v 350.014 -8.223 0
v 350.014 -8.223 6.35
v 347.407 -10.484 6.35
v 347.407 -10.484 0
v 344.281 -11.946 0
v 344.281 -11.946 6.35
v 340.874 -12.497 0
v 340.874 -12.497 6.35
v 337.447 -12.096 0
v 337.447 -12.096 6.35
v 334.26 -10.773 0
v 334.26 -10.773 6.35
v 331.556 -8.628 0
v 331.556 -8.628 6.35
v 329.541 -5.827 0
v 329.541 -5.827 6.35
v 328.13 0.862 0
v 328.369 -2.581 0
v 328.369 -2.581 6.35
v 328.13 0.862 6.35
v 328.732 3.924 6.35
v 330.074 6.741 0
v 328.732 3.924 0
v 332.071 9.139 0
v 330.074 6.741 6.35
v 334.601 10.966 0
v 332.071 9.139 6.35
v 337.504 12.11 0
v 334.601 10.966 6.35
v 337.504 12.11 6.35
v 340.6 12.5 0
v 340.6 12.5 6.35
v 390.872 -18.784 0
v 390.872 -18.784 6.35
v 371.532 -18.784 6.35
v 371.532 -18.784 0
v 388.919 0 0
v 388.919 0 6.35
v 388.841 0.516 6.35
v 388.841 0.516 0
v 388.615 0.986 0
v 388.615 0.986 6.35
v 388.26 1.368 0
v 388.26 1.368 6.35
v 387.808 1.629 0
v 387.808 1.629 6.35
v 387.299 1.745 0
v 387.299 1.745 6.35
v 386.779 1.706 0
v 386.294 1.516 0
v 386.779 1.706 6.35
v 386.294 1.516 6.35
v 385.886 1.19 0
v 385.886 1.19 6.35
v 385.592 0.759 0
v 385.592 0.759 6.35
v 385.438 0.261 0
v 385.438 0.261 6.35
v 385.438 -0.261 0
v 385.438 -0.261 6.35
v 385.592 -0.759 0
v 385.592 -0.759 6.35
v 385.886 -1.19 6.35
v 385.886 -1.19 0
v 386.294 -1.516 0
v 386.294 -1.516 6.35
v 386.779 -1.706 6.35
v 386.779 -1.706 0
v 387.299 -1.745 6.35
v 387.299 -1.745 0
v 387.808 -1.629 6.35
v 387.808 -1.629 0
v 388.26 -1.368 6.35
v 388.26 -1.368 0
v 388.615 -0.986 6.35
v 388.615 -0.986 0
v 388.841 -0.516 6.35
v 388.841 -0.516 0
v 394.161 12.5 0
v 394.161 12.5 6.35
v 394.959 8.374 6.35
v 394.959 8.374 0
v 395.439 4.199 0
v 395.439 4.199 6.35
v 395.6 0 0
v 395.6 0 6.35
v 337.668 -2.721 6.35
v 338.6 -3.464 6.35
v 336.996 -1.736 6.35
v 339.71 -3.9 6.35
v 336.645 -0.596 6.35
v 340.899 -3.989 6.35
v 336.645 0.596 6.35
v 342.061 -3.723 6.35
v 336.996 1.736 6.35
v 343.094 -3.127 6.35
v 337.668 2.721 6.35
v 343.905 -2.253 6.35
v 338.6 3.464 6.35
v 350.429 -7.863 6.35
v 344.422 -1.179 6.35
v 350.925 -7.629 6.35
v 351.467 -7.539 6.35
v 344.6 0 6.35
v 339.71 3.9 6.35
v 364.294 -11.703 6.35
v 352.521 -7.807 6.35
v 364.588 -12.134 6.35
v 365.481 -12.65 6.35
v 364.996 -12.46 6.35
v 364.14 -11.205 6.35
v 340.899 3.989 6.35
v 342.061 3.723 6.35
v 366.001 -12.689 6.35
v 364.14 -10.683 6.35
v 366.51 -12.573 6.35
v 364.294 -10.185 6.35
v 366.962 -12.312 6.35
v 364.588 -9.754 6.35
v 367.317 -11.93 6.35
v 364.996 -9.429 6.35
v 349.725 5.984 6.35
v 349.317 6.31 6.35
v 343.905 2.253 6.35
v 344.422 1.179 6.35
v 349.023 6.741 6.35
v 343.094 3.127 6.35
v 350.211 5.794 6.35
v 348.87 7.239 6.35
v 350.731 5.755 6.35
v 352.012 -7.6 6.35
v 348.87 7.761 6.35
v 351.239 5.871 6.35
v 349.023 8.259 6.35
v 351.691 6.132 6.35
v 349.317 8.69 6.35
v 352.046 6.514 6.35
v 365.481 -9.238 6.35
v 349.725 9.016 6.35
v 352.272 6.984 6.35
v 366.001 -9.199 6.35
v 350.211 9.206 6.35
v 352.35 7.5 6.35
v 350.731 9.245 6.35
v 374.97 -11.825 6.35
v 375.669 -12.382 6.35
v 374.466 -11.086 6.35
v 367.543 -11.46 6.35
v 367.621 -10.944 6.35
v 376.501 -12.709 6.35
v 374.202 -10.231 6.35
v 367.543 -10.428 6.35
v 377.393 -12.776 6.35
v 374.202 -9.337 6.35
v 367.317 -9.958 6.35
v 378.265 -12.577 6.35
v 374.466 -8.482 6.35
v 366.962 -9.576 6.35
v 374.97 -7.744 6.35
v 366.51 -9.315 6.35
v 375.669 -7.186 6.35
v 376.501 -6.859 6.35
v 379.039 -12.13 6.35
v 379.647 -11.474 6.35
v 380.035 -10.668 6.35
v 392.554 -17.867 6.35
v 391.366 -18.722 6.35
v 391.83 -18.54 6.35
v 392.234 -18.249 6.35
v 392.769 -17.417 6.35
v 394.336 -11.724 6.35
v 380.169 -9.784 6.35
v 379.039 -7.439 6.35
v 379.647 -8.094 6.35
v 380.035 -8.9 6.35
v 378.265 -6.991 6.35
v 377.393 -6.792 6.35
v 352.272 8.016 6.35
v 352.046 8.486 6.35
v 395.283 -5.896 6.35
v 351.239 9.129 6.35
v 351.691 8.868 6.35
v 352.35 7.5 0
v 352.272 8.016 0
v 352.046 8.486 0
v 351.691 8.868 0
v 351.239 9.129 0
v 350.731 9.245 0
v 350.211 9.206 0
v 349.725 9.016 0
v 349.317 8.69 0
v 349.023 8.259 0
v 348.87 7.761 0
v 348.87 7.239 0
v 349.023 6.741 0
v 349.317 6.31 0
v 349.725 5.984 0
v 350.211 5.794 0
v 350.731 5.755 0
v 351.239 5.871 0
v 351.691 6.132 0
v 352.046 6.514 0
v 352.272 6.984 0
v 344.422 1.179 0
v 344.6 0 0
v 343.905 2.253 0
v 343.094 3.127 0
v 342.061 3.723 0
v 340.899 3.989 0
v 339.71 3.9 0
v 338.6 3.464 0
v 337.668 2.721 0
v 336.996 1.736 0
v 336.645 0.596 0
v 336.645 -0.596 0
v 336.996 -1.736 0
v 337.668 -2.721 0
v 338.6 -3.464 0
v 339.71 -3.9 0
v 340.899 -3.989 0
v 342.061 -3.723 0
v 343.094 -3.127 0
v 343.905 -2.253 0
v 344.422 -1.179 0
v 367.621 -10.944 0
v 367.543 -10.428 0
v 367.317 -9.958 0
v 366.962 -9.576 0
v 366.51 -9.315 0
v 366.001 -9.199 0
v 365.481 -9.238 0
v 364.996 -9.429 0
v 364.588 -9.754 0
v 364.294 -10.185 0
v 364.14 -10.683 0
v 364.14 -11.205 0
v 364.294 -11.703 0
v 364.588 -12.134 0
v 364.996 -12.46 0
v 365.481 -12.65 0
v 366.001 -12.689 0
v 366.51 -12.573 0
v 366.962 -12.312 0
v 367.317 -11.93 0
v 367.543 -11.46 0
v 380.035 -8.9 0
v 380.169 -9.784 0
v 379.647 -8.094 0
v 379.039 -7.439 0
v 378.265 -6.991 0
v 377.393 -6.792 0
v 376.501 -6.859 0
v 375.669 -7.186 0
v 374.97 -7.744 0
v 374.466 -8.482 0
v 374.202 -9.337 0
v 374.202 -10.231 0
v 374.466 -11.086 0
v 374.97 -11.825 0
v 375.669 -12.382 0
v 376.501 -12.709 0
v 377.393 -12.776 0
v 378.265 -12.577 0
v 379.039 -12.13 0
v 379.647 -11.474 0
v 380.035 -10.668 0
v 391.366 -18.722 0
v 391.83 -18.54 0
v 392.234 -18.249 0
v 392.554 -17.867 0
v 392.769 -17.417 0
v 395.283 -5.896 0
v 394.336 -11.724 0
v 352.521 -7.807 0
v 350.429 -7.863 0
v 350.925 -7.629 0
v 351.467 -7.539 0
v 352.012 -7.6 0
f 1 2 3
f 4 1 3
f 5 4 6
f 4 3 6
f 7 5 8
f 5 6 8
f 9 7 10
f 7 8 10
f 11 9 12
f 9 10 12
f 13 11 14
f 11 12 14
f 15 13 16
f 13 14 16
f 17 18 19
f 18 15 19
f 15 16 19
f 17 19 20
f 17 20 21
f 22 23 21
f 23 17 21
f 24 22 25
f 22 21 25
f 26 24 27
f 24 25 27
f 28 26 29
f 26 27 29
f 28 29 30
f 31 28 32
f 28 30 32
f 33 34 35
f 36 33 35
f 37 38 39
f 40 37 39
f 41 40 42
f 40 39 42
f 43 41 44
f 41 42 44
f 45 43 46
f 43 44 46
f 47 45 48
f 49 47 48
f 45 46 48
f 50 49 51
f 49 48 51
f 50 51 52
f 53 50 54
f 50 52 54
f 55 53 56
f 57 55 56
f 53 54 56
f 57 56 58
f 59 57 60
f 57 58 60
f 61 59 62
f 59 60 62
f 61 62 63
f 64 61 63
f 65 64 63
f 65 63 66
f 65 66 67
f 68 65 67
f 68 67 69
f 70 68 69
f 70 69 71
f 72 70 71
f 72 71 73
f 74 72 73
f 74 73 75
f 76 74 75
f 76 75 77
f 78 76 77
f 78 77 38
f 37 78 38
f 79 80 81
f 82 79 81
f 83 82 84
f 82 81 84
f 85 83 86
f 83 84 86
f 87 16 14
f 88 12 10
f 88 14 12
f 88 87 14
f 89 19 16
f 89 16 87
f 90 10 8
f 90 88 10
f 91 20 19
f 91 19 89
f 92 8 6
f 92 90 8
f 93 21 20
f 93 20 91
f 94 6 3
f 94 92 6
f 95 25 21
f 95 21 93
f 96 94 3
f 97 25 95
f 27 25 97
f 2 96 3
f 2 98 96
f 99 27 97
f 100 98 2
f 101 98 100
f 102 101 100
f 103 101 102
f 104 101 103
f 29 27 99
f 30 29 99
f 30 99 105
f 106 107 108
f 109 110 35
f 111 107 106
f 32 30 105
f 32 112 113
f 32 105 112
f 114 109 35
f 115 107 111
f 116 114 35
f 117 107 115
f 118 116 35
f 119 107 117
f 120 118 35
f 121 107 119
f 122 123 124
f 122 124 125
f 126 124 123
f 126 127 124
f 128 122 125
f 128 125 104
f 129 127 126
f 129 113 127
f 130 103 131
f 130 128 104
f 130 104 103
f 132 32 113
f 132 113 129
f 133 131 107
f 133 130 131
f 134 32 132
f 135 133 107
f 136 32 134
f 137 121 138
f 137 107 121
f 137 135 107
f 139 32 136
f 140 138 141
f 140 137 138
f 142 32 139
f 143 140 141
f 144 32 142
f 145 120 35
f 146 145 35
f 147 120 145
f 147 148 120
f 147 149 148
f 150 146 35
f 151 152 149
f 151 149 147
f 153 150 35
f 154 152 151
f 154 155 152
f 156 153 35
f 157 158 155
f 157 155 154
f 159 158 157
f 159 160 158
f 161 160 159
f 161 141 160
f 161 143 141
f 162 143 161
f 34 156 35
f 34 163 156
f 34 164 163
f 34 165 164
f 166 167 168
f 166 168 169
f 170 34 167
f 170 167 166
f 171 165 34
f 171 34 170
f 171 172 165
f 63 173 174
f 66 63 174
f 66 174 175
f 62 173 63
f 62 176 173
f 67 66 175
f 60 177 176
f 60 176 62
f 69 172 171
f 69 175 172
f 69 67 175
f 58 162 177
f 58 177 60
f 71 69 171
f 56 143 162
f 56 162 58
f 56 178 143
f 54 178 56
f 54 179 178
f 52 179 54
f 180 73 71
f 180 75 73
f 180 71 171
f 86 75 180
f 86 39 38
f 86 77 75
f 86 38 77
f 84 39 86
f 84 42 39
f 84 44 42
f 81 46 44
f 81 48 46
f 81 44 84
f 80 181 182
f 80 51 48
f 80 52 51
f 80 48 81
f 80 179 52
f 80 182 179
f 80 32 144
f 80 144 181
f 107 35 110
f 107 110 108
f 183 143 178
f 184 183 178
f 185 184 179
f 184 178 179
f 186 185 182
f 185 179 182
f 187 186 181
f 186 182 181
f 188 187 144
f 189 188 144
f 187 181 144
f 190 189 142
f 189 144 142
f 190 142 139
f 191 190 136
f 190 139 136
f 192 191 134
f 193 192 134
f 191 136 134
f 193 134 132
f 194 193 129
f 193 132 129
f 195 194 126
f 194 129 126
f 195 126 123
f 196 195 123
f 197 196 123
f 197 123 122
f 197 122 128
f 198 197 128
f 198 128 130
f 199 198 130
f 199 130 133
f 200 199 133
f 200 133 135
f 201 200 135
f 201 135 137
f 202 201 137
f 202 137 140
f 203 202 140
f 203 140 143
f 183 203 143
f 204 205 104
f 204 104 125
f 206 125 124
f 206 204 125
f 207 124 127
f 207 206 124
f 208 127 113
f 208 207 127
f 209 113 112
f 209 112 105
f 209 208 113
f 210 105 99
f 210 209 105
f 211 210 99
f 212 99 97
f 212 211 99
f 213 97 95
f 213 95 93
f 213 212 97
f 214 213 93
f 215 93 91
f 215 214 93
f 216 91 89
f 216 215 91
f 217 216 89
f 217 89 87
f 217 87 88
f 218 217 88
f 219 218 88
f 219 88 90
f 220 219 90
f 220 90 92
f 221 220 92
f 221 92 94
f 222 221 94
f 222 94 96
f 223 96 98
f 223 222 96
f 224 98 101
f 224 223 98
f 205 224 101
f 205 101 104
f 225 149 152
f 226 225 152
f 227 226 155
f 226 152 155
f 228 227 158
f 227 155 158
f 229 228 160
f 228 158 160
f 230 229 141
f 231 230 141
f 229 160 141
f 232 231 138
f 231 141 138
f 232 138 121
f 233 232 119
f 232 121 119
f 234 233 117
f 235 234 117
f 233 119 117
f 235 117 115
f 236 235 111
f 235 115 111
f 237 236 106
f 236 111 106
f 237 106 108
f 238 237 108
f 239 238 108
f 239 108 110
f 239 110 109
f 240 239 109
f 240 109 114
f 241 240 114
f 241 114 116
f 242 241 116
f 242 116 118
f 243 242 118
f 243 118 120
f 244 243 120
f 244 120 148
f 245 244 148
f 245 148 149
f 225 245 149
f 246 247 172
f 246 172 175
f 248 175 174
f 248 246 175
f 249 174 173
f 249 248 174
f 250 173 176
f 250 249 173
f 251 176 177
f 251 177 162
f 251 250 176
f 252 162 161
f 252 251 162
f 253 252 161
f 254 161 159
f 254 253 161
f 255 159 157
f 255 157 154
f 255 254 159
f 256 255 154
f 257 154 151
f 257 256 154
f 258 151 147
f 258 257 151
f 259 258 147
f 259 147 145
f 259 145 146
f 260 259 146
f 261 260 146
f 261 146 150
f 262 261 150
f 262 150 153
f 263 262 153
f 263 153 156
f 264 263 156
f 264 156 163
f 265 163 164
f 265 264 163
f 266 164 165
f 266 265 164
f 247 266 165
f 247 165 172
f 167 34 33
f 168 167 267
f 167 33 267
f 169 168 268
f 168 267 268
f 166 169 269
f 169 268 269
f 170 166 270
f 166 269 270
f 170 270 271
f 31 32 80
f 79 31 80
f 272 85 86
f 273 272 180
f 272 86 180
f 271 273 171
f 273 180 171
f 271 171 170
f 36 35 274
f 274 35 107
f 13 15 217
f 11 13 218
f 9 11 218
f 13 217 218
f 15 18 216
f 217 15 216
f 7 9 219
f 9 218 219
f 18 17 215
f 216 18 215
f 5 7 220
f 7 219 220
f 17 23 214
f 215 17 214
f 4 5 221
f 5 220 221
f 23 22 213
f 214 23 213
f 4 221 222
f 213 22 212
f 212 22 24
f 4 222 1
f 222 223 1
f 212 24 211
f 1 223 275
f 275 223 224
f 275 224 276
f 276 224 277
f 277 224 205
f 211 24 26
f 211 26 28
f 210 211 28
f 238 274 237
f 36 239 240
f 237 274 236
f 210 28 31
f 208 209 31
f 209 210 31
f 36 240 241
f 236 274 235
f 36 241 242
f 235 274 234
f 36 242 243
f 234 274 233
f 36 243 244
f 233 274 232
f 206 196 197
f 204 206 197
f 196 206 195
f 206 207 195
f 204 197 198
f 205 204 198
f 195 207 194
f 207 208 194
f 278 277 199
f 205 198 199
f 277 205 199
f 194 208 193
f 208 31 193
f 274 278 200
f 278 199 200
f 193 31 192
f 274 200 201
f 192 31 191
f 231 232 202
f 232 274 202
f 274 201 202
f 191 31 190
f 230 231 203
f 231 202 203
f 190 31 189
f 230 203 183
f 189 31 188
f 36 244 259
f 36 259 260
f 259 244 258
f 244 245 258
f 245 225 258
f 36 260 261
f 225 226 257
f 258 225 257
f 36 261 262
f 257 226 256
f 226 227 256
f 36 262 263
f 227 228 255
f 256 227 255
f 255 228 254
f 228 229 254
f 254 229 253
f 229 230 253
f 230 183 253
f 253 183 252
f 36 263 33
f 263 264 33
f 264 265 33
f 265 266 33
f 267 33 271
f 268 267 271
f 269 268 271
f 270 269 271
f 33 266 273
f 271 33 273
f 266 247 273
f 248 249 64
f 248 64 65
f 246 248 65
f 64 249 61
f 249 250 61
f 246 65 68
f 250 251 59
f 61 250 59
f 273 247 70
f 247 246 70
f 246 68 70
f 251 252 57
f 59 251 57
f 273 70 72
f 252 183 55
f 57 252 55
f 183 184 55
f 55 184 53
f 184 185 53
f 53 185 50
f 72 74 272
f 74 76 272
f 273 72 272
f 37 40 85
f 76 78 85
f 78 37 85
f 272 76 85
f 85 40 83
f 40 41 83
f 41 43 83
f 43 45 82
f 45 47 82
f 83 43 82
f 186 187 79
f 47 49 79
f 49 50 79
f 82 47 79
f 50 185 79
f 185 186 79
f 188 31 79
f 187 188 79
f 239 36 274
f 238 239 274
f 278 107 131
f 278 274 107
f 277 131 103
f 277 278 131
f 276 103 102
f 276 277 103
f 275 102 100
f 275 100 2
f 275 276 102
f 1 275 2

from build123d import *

# Parameters (mm, degrees)
SKETCH1_W           = 500
SKETCH1_H           = 150
SKETCH1_R           = 9.3
SKETCH1_R_2         = 3
SKETCH1_R_3         = 4
BOSS_EXTRUDE1_DEPTH = 6.35
CUT_EXTRUDE1_DEPTH  = 7
SKETCH4_R           = 9.3
CUT_EXTRUDE2_DEPTH  = 10
FILLET1_R           = 2
CUT_EXTRUDE4_DEPTH  = 10
SKETCH6_R           = 1.75
SKETCH6_R_2         = 3
CUT_EXTRUDE5_DEPTH  = 10


with BuildPart() as part:
    # Sketch1 → Boss-Extrude1 (new body)
    with BuildSketch(Plane.XY):
        with Locations((200, 0)):
            Rectangle(SKETCH1_W, SKETCH1_H)
        Circle(SKETCH1_R, mode=Mode.SUBTRACT)
        with BuildLine():
            ThreePointArc((303.793920425, 21.250000148), (340.59999997, 42.5), (377.406079545, 21.250000201))
            ThreePointArc((377.406079545, 21.250000201), (375.758965412, 15.102885723), (369.61185099, 16.750000063))
            ThreePointArc((369.61185099, 16.750000063), (340.600001147, 33.5), (311.588150157, 16.750002051))
            ThreePointArc((311.588150157, 16.750002051), (305.441035607, 15.102885134), (303.793920425, 21.250000148))
        make_face(mode=Mode.SUBTRACT)
        with Locations((377.1687, -9.7841)):
            Circle(SKETCH1_R_2, mode=Mode.SUBTRACT)
        with Locations((340.6, 0)):
            Circle(SKETCH1_R_3, mode=Mode.SUBTRACT)
    extrude(amount=BOSS_EXTRUDE1_DEPTH)

    # Sketch3 → Cut-Extrude1 (cut)
    with BuildSketch(Plane.XY.offset(6.35)):
        with BuildLine():
            Line((36.827355724, 55), (-50, 55))
            Line((-50, 55), (-50, -75))
            Line((-50, -75), (450, -75))
            Line((450, -75), (450, 55))
            Line((450, 55), (340.6, 55))
            ThreePointArc((340.6, 55), (379.490872965, 38.890872965), (395.6, 0))
            ThreePointArc((395.6, 0), (394.766919757, -9.536498518), (392.292916219, -18.7841))
            ThreePointArc((392.292916219, -18.7841), (329.589221669, -53.886573101), (285.681879129, 3))
            Line((285.681879129, 3), (30.896152423, 3))
            Line((30.896152423, 3), (21.172644276, 3))
            Line((21.172644276, 3), (9.086322138, -9.086322138))
            ThreePointArc((9.086322138, -9.086322138), (-9.086322138, -9.086322138), (-9.086322138, 9.086322138))
            Line((-9.086322138, 9.086322138), (36.827355724, 55))
        make_face()
        with BuildLine():
            Line((328.4653389, 3), (285.681879129, 3))
            ThreePointArc((285.681879129, 3), (329.589221669, -53.886573101), (392.292916219, -18.7841))
            Line((392.292916219, -18.7841), (371.532319214, -18.7841))
            Line((371.532319214, -18.7841), (351.002913897, -6.930323401))
            ThreePointArc((351.002913897, -6.930323401), (335.559903988, -11.438856245), (328.4653389, 3))
        make_face()
        Polygon((-50, 75), (-50, 55), (36.827355724, 55), (340.6, 55), (450, 55), (450, 75), align=None)
    extrude(amount=-CUT_EXTRUDE1_DEPTH, mode=Mode.SUBTRACT)

    # Sketch4 → Cut-Extrude2 (cut)
    with BuildSketch(Plane.XY.offset(6.35)):
        with BuildLine():
            Line((23.112698372, 8), (6.470027048, 24.642671324))
            Line((6.470027048, 24.642671324), (-9.086322138, 9.086322138))
            ThreePointArc((-9.086322138, 9.086322138), (4.917482106, 11.871851993), (12.85, 0))
            ThreePointArc((12.85, 0), (11.871851993, -4.917482106), (9.086322138, -9.086322138))
            Line((9.086322138, -9.086322138), (21.172644276, 3))
            Line((21.172644276, 3), (41, 3))
            Line((41, 3), (41, 8))
            Line((41, 8), (23.112698372, 8))
        make_face()
        with BuildLine():
            ThreePointArc((12.85, 0), (4.917482106, 11.871851993), (-9.086322138, 9.086322138))
            ThreePointArc((-9.086322138, 9.086322138), (-9.086322138, -9.086322138), (9.086322138, -9.086322138))
            ThreePointArc((9.086322138, -9.086322138), (11.871851993, -4.917482106), (12.85, 0))
        make_face()
        Circle(SKETCH4_R, mode=Mode.SUBTRACT)
        Polygon((36.827355724, 55), (30.827355724, 49), (50.827355724, 49), (50.827355724, 55), align=None)
    extrude(amount=-CUT_EXTRUDE2_DEPTH, mode=Mode.SUBTRACT)

    # Fillet1
    fillet1_edges = [part.edges().sort_by_distance(p)[0] for p in [
        (328.4653389, 3, 3.175),
        (351.002913897, -6.930323401, 3.175),
        (392.292916219, -18.7841, 3.175),
    ]]
    fillet(fillet1_edges, radius=FILLET1_R)

    # Sketch5 → Cut-Extrude4 (cut)
    with BuildSketch(Plane.XY.offset(6.35)):
        with BuildLine():
            ThreePointArc((328.129761947, 0.862068966), (332.07139701, 9.138540969), (340.6, 12.5))
            Line((340.6, 12.5), (394.160713214, 12.5))
            ThreePointArc((394.160713214, 12.5), (374.786985828, 43.084219849), (340.6, 55))
            Line((340.6, 55), (50.827355724, 55))
            Line((50.827355724, 55), (50.827355724, 49))
            Line((50.827355724, 49), (30.827355724, 49))
            Line((30.827355724, 49), (6.470027048, 24.642671324))
            Line((6.470027048, 24.642671324), (23.112698372, 8))
            Line((23.112698372, 8), (41, 8))
            Line((41, 8), (41, 3))
            Line((41, 3), (326.134523859, 3))
            ThreePointArc((326.134523859, 3), (327.596690413, 2.364576478), (328.129761947, 0.862068966))
        make_face()
        with BuildLine():
            ThreePointArc((311.588150157, 16.750002051), (305.441035607, 15.102885134), (303.793920425, 21.250000148))
            ThreePointArc((303.793920425, 21.250000148), (340.59999997, 42.5), (377.406079545, 21.250000201))
            ThreePointArc((377.406079545, 21.250000201), (375.758965412, 15.102885723), (369.61185099, 16.750000063))
            ThreePointArc((369.61185099, 16.750000063), (340.600001147, 33.5), (311.588150157, 16.750002051))
        make_face(mode=Mode.SUBTRACT)
    extrude(amount=-CUT_EXTRUDE4_DEPTH, mode=Mode.SUBTRACT)


with BuildPart() as cut_extrude4_kept_piece:
    # of the separate pieces the step leaves, the one the design keeps (cut_extrude4_pieces_kept)
    add(part.part.solids().sort_by_distance((340.6, 12.5, 0))[0])

    # Sketch6 → Cut-Extrude5 (cut)
    with BuildSketch(Plane.XY.offset(6.35)):
        with Locations((350.6, 7.5)):
            Circle(SKETCH6_R)
        with Locations((387.1687, 0)):
            Circle(SKETCH6_R)
        with Locations((377.1687, -9.7841)):
            Circle(SKETCH6_R_2)
        with Locations((365.870678247, -10.944141097)):
            Circle(SKETCH6_R)
    extrude(amount=-CUT_EXTRUDE5_DEPTH, mode=Mode.SUBTRACT)


solid = cut_extrude4_kept_piece.part
